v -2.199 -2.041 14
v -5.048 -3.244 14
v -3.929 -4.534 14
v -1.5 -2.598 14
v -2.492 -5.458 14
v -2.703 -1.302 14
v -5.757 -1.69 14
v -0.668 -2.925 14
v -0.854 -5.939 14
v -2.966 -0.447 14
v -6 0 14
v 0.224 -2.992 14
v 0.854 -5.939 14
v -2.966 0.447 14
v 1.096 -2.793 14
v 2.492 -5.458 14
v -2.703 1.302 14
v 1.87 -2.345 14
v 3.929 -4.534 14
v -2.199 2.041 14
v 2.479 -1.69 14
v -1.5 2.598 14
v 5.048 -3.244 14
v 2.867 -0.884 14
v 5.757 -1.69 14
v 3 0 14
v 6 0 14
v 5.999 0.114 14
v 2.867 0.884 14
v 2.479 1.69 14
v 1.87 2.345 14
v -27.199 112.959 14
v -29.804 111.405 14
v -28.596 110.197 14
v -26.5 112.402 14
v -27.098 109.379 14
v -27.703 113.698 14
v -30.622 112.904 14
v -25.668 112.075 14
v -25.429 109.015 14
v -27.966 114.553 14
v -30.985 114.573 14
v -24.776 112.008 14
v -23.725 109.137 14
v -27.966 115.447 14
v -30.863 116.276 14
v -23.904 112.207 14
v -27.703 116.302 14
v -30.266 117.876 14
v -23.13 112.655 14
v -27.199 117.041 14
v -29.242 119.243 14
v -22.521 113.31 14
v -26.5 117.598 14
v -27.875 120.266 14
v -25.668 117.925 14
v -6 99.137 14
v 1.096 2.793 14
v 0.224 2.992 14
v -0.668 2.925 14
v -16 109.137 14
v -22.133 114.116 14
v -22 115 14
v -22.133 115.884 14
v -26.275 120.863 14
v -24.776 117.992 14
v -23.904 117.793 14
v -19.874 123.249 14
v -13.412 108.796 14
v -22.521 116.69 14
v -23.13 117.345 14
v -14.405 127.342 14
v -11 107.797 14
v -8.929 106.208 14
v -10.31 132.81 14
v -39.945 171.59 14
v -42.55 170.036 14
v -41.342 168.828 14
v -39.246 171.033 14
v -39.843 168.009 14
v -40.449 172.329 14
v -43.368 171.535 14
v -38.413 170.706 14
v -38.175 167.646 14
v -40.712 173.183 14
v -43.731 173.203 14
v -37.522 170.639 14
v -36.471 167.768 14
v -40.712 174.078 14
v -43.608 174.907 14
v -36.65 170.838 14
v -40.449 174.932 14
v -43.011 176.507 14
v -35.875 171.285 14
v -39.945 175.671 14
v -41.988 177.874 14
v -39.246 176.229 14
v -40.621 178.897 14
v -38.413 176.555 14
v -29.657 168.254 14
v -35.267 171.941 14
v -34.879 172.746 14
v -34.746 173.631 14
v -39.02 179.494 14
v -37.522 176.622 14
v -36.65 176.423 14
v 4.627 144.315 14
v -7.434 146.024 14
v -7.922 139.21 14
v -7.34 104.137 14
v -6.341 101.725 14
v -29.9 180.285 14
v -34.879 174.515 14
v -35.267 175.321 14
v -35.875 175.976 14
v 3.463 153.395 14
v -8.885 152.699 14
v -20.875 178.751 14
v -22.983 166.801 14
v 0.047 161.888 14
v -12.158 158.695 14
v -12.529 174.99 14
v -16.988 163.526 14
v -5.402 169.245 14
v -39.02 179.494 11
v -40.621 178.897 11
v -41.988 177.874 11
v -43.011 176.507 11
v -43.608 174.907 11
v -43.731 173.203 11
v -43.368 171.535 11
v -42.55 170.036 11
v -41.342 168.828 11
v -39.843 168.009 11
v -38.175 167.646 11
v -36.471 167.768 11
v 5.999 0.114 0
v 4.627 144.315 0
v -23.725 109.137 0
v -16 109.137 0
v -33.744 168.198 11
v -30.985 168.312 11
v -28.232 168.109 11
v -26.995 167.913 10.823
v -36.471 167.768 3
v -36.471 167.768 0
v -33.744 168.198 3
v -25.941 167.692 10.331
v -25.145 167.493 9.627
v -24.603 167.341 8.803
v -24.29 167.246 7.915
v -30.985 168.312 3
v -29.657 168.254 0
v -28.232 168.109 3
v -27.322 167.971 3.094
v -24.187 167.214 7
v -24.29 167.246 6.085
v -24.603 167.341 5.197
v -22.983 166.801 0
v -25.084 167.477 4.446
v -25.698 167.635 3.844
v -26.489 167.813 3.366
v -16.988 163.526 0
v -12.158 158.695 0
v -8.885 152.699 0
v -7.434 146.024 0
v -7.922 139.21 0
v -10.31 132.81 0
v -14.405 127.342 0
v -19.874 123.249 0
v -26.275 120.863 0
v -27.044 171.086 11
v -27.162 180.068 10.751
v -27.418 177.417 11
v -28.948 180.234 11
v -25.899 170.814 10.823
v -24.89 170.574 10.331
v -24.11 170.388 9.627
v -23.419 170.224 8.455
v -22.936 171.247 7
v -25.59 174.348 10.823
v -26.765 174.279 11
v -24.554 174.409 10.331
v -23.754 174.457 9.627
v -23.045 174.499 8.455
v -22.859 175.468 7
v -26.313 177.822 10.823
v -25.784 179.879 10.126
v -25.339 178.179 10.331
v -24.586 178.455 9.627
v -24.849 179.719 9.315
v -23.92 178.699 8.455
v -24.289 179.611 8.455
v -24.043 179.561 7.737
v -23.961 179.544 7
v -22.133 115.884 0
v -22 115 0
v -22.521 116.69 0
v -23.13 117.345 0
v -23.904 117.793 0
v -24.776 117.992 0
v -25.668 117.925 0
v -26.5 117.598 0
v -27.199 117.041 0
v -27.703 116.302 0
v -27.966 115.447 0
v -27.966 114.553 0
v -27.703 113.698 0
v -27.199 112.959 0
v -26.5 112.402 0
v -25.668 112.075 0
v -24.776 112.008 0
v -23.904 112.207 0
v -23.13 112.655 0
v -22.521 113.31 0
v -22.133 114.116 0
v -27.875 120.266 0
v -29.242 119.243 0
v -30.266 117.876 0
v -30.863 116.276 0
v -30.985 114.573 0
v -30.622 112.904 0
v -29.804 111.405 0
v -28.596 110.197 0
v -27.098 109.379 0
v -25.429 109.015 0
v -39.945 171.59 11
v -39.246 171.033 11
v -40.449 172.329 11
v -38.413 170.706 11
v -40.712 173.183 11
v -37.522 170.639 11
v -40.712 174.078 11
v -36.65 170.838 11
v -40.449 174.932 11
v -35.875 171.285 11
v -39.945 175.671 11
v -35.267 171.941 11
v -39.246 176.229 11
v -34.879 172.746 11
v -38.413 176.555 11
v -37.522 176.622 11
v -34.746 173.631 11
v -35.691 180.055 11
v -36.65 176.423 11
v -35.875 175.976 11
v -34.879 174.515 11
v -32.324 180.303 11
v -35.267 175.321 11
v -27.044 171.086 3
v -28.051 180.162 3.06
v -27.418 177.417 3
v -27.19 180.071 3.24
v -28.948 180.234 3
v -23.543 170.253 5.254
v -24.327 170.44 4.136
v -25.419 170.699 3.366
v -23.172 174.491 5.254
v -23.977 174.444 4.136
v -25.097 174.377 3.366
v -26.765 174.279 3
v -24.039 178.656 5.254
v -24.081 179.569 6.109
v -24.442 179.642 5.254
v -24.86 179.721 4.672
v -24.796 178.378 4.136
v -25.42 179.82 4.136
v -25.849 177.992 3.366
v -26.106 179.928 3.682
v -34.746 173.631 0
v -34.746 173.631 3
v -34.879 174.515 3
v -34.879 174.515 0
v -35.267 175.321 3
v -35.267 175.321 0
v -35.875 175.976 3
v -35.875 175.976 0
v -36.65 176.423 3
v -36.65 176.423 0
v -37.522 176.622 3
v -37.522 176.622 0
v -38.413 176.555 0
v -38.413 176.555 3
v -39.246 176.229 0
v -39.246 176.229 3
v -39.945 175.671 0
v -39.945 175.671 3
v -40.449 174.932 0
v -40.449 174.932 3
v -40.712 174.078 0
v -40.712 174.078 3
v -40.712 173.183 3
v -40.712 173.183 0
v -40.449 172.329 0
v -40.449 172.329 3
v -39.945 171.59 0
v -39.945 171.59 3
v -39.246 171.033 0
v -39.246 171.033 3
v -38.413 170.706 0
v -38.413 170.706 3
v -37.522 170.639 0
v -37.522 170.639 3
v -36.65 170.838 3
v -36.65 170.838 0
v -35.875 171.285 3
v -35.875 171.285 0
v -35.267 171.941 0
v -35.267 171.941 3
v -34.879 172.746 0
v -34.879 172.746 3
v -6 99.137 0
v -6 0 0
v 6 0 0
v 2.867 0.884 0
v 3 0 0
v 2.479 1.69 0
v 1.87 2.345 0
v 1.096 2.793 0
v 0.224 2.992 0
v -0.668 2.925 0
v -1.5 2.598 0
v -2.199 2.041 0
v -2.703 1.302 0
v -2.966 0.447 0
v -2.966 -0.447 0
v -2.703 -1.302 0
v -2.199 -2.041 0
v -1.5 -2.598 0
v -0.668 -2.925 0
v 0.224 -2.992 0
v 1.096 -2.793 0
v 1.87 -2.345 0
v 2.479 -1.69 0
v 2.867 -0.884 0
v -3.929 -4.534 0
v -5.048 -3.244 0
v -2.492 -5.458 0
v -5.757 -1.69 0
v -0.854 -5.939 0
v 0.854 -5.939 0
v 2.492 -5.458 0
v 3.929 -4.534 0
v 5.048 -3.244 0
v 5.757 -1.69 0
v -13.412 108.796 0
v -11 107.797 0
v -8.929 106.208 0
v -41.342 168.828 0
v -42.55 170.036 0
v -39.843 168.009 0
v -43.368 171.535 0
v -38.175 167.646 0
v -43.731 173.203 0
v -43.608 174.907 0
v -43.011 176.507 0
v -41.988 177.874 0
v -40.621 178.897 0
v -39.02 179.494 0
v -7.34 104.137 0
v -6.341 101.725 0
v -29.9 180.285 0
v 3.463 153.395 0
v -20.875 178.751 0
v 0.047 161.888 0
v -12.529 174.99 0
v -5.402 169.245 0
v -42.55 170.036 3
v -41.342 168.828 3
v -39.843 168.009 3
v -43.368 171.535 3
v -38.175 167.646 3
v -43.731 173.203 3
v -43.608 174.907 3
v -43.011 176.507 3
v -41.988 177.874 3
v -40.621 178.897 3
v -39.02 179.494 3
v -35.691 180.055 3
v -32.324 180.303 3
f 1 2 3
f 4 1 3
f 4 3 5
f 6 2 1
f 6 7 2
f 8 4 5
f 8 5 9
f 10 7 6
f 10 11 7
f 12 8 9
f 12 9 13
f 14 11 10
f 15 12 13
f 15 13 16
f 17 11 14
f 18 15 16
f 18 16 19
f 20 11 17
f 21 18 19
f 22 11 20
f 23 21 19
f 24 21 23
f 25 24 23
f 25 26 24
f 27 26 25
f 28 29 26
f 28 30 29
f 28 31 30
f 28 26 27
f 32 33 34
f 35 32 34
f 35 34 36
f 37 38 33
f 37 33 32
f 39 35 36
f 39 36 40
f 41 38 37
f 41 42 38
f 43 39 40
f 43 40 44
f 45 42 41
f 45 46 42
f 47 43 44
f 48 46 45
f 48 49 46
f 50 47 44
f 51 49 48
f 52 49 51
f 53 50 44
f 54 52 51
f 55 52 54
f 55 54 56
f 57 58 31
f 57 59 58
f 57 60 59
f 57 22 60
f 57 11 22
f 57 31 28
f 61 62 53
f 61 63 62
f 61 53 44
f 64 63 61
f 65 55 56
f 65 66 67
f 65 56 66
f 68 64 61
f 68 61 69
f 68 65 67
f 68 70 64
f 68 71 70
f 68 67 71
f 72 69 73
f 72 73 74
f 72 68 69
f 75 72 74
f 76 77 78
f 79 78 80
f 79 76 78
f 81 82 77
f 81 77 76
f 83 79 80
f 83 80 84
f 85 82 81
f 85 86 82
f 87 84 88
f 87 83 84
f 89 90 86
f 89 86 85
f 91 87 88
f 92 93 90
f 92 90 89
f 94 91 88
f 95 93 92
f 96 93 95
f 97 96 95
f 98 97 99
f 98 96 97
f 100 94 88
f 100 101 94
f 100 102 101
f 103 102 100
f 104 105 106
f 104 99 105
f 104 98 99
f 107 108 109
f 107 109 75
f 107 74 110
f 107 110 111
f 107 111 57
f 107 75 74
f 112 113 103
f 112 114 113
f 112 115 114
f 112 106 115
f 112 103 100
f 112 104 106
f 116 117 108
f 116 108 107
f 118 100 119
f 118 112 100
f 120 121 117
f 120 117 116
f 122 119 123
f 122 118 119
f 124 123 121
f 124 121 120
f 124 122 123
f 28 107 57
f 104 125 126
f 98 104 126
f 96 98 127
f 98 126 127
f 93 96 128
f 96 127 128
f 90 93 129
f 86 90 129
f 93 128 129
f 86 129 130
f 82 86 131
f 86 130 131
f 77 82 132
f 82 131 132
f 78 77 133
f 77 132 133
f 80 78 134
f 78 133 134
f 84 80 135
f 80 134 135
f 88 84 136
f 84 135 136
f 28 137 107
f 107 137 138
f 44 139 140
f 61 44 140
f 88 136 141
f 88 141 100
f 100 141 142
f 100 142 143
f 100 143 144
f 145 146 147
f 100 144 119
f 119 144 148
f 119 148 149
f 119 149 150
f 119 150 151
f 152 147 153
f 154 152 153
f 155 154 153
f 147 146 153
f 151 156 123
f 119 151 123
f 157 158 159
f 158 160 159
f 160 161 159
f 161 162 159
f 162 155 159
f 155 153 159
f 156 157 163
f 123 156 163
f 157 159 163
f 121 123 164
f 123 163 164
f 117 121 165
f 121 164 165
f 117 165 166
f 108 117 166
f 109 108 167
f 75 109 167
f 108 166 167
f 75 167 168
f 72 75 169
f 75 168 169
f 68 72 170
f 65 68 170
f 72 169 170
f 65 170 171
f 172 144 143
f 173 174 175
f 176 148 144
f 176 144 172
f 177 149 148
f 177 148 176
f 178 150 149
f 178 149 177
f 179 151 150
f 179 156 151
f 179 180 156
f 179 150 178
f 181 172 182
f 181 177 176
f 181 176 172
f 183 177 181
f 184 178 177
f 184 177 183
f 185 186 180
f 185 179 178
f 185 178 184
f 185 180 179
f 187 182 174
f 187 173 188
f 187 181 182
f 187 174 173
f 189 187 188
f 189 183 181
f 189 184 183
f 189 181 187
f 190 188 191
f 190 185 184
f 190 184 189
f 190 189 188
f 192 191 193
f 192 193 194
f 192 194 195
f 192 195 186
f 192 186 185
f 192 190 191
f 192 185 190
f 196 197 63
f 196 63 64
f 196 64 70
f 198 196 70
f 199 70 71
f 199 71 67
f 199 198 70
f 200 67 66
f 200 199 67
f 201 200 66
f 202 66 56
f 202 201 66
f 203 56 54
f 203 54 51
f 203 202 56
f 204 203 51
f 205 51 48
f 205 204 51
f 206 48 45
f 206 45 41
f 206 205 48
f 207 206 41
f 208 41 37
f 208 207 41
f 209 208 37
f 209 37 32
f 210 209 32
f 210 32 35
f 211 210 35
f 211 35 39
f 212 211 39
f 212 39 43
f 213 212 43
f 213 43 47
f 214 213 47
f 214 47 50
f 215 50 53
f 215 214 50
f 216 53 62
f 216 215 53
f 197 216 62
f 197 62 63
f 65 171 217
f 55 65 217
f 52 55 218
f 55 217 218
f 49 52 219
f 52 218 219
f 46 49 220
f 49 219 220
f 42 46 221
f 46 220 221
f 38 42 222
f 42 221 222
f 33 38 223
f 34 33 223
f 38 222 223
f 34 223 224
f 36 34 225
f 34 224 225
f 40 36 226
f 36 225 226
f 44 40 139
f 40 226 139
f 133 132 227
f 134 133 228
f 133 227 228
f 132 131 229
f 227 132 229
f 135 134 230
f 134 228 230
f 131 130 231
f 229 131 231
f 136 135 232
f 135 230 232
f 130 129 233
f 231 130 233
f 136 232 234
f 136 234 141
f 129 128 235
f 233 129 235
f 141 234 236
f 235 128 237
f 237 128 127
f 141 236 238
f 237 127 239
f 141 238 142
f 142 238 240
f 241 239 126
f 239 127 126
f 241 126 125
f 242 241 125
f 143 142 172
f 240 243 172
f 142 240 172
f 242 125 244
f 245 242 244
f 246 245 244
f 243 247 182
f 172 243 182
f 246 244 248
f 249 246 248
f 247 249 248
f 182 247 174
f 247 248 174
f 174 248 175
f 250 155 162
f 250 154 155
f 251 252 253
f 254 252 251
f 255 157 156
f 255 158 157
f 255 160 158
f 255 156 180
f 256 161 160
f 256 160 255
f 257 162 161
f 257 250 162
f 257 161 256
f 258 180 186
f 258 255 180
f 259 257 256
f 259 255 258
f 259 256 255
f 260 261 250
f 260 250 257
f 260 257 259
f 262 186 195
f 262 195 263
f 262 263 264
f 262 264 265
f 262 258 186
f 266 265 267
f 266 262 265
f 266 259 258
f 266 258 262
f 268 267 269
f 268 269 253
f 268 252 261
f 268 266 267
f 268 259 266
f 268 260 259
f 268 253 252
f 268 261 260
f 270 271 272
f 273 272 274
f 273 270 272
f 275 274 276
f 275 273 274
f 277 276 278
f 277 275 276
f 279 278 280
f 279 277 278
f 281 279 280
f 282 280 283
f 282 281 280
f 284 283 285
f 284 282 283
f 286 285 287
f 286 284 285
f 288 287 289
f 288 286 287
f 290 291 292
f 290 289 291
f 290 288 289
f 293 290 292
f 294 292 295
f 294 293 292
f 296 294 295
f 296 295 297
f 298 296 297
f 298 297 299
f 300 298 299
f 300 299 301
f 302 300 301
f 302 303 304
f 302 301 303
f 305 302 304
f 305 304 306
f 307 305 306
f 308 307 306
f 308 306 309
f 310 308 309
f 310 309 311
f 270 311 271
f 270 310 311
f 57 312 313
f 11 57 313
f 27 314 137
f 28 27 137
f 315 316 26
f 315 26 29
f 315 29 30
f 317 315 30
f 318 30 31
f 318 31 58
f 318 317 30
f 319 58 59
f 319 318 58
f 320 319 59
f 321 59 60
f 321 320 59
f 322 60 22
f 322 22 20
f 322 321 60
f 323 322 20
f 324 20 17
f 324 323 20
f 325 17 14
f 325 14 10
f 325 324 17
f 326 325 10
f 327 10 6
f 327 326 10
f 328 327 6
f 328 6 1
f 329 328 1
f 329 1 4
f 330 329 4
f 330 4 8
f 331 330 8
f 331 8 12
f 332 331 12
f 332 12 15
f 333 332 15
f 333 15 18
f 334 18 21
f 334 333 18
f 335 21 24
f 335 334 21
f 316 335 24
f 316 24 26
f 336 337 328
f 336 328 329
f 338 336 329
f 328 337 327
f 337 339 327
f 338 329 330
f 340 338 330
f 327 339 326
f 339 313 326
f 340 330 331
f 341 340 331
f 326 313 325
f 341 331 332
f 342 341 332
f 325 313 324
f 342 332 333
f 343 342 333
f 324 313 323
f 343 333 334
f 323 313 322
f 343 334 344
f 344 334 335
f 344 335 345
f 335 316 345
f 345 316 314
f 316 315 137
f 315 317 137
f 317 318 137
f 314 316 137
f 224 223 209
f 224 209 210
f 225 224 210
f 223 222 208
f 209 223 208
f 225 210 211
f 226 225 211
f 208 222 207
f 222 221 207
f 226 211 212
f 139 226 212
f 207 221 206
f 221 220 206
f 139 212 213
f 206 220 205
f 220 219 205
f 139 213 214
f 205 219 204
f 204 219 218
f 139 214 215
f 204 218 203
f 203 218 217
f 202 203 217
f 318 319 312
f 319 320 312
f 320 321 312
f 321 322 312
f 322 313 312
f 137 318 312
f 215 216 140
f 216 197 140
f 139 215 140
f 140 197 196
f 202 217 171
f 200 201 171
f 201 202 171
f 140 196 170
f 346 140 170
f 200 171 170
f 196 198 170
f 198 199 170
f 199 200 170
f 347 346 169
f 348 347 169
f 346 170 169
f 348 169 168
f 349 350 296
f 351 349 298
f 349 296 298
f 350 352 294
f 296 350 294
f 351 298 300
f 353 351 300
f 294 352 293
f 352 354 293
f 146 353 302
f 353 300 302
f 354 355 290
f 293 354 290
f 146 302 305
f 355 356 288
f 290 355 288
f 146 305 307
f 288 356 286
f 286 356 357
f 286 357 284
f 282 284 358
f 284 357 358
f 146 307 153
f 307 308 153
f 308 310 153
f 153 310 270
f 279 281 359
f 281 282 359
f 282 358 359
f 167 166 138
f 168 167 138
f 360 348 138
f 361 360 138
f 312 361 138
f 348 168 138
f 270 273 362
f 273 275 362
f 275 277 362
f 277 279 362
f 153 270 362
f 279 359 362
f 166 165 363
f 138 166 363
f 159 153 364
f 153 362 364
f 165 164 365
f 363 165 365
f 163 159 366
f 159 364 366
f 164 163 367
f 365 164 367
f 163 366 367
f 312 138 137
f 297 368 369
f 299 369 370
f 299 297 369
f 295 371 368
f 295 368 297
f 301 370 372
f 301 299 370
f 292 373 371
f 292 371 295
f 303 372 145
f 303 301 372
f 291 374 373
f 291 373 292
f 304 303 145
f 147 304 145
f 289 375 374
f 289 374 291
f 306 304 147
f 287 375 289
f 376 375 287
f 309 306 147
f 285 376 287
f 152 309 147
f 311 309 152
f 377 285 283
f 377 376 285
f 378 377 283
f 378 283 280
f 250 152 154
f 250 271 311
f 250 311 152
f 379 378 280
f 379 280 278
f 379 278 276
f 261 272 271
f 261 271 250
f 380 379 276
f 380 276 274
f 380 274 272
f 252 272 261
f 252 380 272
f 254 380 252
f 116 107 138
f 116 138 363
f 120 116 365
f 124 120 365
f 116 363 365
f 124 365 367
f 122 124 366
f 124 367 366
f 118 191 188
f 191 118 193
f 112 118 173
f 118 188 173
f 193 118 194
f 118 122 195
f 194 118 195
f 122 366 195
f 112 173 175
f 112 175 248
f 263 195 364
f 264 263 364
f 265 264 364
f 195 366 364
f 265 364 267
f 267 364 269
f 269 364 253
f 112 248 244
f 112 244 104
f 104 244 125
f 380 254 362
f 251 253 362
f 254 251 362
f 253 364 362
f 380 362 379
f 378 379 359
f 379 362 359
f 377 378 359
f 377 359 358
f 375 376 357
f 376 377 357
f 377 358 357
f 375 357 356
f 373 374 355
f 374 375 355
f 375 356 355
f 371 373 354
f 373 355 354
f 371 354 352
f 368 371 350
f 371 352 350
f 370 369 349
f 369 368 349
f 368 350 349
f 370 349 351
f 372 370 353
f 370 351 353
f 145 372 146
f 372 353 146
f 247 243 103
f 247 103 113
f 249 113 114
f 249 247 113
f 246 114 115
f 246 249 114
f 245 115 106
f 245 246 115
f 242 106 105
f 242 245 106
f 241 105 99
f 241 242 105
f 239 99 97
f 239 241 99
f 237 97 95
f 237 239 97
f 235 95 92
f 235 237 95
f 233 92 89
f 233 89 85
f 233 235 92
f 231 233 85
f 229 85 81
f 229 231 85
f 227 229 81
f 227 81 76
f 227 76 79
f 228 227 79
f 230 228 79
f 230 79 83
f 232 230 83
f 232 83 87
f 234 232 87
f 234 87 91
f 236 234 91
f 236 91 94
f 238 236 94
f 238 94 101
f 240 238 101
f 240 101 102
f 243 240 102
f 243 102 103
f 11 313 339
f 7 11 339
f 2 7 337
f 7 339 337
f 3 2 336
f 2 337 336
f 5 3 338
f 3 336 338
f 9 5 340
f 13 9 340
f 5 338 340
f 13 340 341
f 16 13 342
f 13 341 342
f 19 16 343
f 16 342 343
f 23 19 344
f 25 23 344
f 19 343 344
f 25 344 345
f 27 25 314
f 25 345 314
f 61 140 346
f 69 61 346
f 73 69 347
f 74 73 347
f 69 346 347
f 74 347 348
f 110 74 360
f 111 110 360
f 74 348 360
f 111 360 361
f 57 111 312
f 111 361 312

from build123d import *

# Parameters (mm, degrees)
CROQUIS1_R              = 6
CROQUIS1_R_2            = 3
SALIENTE_EXTRUIR1_DEPTH = 14
CORTAR_EXTRUIR1_START   = -3
CROQUIS3_R              = 15
CORTAR_EXTRUIR1_DEPTH   = 8
REDONDEO1_R             = 4


with BuildPart() as part:
    # Croquis1 → Saliente-Extruir1 (new body)
    # profile 1 of 5: a face of its own
    with BuildSketch(Plane.XY):
        with BuildLine():
            ThreePointArc((-23.725422134, 109.136941816), (-3.343361872, 121.724461131), (4.62711067, 144.315290918))
            ThreePointArc((4.62711067, 144.315290918), (-8.782059543, 172.344818376), (-39.020356526, 179.493640019))
            ThreePointArc((-39.020356526, 179.493640019), (-33.980640362, 178.302169745), (-31.74577866, 173.630581835))
            ThreePointArc((-31.74577866, 173.630581835), (-33.07419075, 169.865443538), (-36.471200794, 167.767523652))
            ThreePointArc((-36.471200794, 167.767523652), (-7.920656596, 149.413602382), (-26.274577866, 120.863058184))
            ThreePointArc((-26.274577866, 120.863058184), (-21.234861702, 119.67158791), (-19, 115))
            ThreePointArc((-19, 115), (-20.32841209, 111.234861702), (-23.725422134, 109.136941816))
        make_face()
    # profile 2 of 5: a face of its own
    with BuildSketch(Plane.XY):
        with Locations((-37.74577866, 173.630581835)):
            Circle(CROQUIS1_R)
        with Locations((-37.74577866, 173.630581835)):
            Circle(CROQUIS1_R_2, mode=Mode.SUBTRACT)
    # profile 3 of 5: a face of its own
    with BuildSketch(Plane.XY):
        with Locations((-25, 115)):
            Circle(CROQUIS1_R)
        with Locations((-25, 115)):
            Circle(CROQUIS1_R_2, mode=Mode.SUBTRACT)
    # profile 4 of 5: a face of its own
    with BuildSketch(Plane.XY):
        with BuildLine():
            Line((5.998914104, 0.114147164), (4.62711067, 144.315290918))
            ThreePointArc((4.62711067, 144.315290918), (-3.343361872, 121.724461131), (-23.725422134, 109.136941816))
            Line((-23.725422134, 109.136941816), (-16, 109.136941816))
            ThreePointArc((-16, 109.136941816), (-8.928932188, 106.208009628), (-6, 99.136941816))
            Line((-6, 99.136941816), (-6, 0))
            ThreePointArc((-6, 0), (-0.057076164, 5.99972852), (5.998914104, 0.114147164))
        make_face()
    # profile 5 of 5: a face of its own
    with BuildSketch(Plane.XY):
        with BuildLine():
            Line((6, 0), (5.998914104, 0.114147164))
            ThreePointArc((5.998914104, 0.114147164), (-0.057076164, 5.99972852), (-6, 0))
            ThreePointArc((-6, 0), (0, -6), (6, 0))
        make_face()
        Circle(CROQUIS1_R_2, mode=Mode.SUBTRACT)
    extrude(amount=SALIENTE_EXTRUIR1_DEPTH)

    # Croquis3 → Cortar-Extruir1 (cut)
    with BuildSketch(Plane.XY.offset(14).offset(CORTAR_EXTRUIR1_START)):
        with Locations((-37.74577866, 173.630581835)):
            Circle(CROQUIS3_R)
    extrude(amount=-CORTAR_EXTRUIR1_DEPTH, mode=Mode.SUBTRACT)

    # Redondeo1
    redondeo1_edges = [part.edges().sort_by_distance(p)[0] for p in [
        (-22.748314626, 173.3547693, 11),
        (-22.748314626, 173.3547693, 3),
    ]]
    fillet(redondeo1_edges, radius=REDONDEO1_R - 0.0001)  # a hair under: the kernel refuses the full size


solid = part.part
